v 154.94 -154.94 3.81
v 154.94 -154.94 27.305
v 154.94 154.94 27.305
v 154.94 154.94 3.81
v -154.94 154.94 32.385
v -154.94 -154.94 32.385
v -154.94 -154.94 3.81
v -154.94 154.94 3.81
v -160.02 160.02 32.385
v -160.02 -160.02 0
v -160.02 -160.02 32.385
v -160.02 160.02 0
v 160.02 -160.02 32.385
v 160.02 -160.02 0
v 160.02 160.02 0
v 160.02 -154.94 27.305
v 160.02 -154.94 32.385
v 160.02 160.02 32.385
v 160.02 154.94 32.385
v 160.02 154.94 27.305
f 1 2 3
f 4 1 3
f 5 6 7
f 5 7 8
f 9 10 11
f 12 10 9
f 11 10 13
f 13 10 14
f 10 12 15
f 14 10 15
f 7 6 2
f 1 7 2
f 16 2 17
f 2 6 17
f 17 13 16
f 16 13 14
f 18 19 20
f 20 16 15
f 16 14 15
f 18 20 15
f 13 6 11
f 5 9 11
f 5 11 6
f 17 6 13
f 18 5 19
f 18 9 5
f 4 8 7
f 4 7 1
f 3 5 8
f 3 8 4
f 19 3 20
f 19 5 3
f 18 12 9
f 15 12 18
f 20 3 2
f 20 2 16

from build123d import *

# Parameters (mm, degrees)
F0_W     = 320.04
F0_H     = 320.04
F1_DEPTH = 32.385
F2_W     = 309.88
F2_H     = 309.88
F3_DEPTH = 28.575
F4_W     = 5.08
F4_H     = 309.88
F5_DEPTH = 5.08


with BuildPart() as f1:
    # F0 (on Top) → F1 (new body)
    with BuildSketch(Plane.XY):
        Rectangle(F0_W, F0_H)
    extrude(amount=F1_DEPTH)

    # F2 (on face) → F3 (cut)
    with BuildSketch(Plane.XY.offset(32.385)):
        Rectangle(F2_W, F2_H)
    extrude(amount=-F3_DEPTH, mode=Mode.SUBTRACT)

    # F4 (on face) → F5 (cut)
    with BuildSketch(Plane.XY.offset(32.385)):
        with Locations((157.48, 0)):
            Rectangle(F4_W, F4_H)
    extrude(amount=-F5_DEPTH, mode=Mode.SUBTRACT)


solid = f1.part
